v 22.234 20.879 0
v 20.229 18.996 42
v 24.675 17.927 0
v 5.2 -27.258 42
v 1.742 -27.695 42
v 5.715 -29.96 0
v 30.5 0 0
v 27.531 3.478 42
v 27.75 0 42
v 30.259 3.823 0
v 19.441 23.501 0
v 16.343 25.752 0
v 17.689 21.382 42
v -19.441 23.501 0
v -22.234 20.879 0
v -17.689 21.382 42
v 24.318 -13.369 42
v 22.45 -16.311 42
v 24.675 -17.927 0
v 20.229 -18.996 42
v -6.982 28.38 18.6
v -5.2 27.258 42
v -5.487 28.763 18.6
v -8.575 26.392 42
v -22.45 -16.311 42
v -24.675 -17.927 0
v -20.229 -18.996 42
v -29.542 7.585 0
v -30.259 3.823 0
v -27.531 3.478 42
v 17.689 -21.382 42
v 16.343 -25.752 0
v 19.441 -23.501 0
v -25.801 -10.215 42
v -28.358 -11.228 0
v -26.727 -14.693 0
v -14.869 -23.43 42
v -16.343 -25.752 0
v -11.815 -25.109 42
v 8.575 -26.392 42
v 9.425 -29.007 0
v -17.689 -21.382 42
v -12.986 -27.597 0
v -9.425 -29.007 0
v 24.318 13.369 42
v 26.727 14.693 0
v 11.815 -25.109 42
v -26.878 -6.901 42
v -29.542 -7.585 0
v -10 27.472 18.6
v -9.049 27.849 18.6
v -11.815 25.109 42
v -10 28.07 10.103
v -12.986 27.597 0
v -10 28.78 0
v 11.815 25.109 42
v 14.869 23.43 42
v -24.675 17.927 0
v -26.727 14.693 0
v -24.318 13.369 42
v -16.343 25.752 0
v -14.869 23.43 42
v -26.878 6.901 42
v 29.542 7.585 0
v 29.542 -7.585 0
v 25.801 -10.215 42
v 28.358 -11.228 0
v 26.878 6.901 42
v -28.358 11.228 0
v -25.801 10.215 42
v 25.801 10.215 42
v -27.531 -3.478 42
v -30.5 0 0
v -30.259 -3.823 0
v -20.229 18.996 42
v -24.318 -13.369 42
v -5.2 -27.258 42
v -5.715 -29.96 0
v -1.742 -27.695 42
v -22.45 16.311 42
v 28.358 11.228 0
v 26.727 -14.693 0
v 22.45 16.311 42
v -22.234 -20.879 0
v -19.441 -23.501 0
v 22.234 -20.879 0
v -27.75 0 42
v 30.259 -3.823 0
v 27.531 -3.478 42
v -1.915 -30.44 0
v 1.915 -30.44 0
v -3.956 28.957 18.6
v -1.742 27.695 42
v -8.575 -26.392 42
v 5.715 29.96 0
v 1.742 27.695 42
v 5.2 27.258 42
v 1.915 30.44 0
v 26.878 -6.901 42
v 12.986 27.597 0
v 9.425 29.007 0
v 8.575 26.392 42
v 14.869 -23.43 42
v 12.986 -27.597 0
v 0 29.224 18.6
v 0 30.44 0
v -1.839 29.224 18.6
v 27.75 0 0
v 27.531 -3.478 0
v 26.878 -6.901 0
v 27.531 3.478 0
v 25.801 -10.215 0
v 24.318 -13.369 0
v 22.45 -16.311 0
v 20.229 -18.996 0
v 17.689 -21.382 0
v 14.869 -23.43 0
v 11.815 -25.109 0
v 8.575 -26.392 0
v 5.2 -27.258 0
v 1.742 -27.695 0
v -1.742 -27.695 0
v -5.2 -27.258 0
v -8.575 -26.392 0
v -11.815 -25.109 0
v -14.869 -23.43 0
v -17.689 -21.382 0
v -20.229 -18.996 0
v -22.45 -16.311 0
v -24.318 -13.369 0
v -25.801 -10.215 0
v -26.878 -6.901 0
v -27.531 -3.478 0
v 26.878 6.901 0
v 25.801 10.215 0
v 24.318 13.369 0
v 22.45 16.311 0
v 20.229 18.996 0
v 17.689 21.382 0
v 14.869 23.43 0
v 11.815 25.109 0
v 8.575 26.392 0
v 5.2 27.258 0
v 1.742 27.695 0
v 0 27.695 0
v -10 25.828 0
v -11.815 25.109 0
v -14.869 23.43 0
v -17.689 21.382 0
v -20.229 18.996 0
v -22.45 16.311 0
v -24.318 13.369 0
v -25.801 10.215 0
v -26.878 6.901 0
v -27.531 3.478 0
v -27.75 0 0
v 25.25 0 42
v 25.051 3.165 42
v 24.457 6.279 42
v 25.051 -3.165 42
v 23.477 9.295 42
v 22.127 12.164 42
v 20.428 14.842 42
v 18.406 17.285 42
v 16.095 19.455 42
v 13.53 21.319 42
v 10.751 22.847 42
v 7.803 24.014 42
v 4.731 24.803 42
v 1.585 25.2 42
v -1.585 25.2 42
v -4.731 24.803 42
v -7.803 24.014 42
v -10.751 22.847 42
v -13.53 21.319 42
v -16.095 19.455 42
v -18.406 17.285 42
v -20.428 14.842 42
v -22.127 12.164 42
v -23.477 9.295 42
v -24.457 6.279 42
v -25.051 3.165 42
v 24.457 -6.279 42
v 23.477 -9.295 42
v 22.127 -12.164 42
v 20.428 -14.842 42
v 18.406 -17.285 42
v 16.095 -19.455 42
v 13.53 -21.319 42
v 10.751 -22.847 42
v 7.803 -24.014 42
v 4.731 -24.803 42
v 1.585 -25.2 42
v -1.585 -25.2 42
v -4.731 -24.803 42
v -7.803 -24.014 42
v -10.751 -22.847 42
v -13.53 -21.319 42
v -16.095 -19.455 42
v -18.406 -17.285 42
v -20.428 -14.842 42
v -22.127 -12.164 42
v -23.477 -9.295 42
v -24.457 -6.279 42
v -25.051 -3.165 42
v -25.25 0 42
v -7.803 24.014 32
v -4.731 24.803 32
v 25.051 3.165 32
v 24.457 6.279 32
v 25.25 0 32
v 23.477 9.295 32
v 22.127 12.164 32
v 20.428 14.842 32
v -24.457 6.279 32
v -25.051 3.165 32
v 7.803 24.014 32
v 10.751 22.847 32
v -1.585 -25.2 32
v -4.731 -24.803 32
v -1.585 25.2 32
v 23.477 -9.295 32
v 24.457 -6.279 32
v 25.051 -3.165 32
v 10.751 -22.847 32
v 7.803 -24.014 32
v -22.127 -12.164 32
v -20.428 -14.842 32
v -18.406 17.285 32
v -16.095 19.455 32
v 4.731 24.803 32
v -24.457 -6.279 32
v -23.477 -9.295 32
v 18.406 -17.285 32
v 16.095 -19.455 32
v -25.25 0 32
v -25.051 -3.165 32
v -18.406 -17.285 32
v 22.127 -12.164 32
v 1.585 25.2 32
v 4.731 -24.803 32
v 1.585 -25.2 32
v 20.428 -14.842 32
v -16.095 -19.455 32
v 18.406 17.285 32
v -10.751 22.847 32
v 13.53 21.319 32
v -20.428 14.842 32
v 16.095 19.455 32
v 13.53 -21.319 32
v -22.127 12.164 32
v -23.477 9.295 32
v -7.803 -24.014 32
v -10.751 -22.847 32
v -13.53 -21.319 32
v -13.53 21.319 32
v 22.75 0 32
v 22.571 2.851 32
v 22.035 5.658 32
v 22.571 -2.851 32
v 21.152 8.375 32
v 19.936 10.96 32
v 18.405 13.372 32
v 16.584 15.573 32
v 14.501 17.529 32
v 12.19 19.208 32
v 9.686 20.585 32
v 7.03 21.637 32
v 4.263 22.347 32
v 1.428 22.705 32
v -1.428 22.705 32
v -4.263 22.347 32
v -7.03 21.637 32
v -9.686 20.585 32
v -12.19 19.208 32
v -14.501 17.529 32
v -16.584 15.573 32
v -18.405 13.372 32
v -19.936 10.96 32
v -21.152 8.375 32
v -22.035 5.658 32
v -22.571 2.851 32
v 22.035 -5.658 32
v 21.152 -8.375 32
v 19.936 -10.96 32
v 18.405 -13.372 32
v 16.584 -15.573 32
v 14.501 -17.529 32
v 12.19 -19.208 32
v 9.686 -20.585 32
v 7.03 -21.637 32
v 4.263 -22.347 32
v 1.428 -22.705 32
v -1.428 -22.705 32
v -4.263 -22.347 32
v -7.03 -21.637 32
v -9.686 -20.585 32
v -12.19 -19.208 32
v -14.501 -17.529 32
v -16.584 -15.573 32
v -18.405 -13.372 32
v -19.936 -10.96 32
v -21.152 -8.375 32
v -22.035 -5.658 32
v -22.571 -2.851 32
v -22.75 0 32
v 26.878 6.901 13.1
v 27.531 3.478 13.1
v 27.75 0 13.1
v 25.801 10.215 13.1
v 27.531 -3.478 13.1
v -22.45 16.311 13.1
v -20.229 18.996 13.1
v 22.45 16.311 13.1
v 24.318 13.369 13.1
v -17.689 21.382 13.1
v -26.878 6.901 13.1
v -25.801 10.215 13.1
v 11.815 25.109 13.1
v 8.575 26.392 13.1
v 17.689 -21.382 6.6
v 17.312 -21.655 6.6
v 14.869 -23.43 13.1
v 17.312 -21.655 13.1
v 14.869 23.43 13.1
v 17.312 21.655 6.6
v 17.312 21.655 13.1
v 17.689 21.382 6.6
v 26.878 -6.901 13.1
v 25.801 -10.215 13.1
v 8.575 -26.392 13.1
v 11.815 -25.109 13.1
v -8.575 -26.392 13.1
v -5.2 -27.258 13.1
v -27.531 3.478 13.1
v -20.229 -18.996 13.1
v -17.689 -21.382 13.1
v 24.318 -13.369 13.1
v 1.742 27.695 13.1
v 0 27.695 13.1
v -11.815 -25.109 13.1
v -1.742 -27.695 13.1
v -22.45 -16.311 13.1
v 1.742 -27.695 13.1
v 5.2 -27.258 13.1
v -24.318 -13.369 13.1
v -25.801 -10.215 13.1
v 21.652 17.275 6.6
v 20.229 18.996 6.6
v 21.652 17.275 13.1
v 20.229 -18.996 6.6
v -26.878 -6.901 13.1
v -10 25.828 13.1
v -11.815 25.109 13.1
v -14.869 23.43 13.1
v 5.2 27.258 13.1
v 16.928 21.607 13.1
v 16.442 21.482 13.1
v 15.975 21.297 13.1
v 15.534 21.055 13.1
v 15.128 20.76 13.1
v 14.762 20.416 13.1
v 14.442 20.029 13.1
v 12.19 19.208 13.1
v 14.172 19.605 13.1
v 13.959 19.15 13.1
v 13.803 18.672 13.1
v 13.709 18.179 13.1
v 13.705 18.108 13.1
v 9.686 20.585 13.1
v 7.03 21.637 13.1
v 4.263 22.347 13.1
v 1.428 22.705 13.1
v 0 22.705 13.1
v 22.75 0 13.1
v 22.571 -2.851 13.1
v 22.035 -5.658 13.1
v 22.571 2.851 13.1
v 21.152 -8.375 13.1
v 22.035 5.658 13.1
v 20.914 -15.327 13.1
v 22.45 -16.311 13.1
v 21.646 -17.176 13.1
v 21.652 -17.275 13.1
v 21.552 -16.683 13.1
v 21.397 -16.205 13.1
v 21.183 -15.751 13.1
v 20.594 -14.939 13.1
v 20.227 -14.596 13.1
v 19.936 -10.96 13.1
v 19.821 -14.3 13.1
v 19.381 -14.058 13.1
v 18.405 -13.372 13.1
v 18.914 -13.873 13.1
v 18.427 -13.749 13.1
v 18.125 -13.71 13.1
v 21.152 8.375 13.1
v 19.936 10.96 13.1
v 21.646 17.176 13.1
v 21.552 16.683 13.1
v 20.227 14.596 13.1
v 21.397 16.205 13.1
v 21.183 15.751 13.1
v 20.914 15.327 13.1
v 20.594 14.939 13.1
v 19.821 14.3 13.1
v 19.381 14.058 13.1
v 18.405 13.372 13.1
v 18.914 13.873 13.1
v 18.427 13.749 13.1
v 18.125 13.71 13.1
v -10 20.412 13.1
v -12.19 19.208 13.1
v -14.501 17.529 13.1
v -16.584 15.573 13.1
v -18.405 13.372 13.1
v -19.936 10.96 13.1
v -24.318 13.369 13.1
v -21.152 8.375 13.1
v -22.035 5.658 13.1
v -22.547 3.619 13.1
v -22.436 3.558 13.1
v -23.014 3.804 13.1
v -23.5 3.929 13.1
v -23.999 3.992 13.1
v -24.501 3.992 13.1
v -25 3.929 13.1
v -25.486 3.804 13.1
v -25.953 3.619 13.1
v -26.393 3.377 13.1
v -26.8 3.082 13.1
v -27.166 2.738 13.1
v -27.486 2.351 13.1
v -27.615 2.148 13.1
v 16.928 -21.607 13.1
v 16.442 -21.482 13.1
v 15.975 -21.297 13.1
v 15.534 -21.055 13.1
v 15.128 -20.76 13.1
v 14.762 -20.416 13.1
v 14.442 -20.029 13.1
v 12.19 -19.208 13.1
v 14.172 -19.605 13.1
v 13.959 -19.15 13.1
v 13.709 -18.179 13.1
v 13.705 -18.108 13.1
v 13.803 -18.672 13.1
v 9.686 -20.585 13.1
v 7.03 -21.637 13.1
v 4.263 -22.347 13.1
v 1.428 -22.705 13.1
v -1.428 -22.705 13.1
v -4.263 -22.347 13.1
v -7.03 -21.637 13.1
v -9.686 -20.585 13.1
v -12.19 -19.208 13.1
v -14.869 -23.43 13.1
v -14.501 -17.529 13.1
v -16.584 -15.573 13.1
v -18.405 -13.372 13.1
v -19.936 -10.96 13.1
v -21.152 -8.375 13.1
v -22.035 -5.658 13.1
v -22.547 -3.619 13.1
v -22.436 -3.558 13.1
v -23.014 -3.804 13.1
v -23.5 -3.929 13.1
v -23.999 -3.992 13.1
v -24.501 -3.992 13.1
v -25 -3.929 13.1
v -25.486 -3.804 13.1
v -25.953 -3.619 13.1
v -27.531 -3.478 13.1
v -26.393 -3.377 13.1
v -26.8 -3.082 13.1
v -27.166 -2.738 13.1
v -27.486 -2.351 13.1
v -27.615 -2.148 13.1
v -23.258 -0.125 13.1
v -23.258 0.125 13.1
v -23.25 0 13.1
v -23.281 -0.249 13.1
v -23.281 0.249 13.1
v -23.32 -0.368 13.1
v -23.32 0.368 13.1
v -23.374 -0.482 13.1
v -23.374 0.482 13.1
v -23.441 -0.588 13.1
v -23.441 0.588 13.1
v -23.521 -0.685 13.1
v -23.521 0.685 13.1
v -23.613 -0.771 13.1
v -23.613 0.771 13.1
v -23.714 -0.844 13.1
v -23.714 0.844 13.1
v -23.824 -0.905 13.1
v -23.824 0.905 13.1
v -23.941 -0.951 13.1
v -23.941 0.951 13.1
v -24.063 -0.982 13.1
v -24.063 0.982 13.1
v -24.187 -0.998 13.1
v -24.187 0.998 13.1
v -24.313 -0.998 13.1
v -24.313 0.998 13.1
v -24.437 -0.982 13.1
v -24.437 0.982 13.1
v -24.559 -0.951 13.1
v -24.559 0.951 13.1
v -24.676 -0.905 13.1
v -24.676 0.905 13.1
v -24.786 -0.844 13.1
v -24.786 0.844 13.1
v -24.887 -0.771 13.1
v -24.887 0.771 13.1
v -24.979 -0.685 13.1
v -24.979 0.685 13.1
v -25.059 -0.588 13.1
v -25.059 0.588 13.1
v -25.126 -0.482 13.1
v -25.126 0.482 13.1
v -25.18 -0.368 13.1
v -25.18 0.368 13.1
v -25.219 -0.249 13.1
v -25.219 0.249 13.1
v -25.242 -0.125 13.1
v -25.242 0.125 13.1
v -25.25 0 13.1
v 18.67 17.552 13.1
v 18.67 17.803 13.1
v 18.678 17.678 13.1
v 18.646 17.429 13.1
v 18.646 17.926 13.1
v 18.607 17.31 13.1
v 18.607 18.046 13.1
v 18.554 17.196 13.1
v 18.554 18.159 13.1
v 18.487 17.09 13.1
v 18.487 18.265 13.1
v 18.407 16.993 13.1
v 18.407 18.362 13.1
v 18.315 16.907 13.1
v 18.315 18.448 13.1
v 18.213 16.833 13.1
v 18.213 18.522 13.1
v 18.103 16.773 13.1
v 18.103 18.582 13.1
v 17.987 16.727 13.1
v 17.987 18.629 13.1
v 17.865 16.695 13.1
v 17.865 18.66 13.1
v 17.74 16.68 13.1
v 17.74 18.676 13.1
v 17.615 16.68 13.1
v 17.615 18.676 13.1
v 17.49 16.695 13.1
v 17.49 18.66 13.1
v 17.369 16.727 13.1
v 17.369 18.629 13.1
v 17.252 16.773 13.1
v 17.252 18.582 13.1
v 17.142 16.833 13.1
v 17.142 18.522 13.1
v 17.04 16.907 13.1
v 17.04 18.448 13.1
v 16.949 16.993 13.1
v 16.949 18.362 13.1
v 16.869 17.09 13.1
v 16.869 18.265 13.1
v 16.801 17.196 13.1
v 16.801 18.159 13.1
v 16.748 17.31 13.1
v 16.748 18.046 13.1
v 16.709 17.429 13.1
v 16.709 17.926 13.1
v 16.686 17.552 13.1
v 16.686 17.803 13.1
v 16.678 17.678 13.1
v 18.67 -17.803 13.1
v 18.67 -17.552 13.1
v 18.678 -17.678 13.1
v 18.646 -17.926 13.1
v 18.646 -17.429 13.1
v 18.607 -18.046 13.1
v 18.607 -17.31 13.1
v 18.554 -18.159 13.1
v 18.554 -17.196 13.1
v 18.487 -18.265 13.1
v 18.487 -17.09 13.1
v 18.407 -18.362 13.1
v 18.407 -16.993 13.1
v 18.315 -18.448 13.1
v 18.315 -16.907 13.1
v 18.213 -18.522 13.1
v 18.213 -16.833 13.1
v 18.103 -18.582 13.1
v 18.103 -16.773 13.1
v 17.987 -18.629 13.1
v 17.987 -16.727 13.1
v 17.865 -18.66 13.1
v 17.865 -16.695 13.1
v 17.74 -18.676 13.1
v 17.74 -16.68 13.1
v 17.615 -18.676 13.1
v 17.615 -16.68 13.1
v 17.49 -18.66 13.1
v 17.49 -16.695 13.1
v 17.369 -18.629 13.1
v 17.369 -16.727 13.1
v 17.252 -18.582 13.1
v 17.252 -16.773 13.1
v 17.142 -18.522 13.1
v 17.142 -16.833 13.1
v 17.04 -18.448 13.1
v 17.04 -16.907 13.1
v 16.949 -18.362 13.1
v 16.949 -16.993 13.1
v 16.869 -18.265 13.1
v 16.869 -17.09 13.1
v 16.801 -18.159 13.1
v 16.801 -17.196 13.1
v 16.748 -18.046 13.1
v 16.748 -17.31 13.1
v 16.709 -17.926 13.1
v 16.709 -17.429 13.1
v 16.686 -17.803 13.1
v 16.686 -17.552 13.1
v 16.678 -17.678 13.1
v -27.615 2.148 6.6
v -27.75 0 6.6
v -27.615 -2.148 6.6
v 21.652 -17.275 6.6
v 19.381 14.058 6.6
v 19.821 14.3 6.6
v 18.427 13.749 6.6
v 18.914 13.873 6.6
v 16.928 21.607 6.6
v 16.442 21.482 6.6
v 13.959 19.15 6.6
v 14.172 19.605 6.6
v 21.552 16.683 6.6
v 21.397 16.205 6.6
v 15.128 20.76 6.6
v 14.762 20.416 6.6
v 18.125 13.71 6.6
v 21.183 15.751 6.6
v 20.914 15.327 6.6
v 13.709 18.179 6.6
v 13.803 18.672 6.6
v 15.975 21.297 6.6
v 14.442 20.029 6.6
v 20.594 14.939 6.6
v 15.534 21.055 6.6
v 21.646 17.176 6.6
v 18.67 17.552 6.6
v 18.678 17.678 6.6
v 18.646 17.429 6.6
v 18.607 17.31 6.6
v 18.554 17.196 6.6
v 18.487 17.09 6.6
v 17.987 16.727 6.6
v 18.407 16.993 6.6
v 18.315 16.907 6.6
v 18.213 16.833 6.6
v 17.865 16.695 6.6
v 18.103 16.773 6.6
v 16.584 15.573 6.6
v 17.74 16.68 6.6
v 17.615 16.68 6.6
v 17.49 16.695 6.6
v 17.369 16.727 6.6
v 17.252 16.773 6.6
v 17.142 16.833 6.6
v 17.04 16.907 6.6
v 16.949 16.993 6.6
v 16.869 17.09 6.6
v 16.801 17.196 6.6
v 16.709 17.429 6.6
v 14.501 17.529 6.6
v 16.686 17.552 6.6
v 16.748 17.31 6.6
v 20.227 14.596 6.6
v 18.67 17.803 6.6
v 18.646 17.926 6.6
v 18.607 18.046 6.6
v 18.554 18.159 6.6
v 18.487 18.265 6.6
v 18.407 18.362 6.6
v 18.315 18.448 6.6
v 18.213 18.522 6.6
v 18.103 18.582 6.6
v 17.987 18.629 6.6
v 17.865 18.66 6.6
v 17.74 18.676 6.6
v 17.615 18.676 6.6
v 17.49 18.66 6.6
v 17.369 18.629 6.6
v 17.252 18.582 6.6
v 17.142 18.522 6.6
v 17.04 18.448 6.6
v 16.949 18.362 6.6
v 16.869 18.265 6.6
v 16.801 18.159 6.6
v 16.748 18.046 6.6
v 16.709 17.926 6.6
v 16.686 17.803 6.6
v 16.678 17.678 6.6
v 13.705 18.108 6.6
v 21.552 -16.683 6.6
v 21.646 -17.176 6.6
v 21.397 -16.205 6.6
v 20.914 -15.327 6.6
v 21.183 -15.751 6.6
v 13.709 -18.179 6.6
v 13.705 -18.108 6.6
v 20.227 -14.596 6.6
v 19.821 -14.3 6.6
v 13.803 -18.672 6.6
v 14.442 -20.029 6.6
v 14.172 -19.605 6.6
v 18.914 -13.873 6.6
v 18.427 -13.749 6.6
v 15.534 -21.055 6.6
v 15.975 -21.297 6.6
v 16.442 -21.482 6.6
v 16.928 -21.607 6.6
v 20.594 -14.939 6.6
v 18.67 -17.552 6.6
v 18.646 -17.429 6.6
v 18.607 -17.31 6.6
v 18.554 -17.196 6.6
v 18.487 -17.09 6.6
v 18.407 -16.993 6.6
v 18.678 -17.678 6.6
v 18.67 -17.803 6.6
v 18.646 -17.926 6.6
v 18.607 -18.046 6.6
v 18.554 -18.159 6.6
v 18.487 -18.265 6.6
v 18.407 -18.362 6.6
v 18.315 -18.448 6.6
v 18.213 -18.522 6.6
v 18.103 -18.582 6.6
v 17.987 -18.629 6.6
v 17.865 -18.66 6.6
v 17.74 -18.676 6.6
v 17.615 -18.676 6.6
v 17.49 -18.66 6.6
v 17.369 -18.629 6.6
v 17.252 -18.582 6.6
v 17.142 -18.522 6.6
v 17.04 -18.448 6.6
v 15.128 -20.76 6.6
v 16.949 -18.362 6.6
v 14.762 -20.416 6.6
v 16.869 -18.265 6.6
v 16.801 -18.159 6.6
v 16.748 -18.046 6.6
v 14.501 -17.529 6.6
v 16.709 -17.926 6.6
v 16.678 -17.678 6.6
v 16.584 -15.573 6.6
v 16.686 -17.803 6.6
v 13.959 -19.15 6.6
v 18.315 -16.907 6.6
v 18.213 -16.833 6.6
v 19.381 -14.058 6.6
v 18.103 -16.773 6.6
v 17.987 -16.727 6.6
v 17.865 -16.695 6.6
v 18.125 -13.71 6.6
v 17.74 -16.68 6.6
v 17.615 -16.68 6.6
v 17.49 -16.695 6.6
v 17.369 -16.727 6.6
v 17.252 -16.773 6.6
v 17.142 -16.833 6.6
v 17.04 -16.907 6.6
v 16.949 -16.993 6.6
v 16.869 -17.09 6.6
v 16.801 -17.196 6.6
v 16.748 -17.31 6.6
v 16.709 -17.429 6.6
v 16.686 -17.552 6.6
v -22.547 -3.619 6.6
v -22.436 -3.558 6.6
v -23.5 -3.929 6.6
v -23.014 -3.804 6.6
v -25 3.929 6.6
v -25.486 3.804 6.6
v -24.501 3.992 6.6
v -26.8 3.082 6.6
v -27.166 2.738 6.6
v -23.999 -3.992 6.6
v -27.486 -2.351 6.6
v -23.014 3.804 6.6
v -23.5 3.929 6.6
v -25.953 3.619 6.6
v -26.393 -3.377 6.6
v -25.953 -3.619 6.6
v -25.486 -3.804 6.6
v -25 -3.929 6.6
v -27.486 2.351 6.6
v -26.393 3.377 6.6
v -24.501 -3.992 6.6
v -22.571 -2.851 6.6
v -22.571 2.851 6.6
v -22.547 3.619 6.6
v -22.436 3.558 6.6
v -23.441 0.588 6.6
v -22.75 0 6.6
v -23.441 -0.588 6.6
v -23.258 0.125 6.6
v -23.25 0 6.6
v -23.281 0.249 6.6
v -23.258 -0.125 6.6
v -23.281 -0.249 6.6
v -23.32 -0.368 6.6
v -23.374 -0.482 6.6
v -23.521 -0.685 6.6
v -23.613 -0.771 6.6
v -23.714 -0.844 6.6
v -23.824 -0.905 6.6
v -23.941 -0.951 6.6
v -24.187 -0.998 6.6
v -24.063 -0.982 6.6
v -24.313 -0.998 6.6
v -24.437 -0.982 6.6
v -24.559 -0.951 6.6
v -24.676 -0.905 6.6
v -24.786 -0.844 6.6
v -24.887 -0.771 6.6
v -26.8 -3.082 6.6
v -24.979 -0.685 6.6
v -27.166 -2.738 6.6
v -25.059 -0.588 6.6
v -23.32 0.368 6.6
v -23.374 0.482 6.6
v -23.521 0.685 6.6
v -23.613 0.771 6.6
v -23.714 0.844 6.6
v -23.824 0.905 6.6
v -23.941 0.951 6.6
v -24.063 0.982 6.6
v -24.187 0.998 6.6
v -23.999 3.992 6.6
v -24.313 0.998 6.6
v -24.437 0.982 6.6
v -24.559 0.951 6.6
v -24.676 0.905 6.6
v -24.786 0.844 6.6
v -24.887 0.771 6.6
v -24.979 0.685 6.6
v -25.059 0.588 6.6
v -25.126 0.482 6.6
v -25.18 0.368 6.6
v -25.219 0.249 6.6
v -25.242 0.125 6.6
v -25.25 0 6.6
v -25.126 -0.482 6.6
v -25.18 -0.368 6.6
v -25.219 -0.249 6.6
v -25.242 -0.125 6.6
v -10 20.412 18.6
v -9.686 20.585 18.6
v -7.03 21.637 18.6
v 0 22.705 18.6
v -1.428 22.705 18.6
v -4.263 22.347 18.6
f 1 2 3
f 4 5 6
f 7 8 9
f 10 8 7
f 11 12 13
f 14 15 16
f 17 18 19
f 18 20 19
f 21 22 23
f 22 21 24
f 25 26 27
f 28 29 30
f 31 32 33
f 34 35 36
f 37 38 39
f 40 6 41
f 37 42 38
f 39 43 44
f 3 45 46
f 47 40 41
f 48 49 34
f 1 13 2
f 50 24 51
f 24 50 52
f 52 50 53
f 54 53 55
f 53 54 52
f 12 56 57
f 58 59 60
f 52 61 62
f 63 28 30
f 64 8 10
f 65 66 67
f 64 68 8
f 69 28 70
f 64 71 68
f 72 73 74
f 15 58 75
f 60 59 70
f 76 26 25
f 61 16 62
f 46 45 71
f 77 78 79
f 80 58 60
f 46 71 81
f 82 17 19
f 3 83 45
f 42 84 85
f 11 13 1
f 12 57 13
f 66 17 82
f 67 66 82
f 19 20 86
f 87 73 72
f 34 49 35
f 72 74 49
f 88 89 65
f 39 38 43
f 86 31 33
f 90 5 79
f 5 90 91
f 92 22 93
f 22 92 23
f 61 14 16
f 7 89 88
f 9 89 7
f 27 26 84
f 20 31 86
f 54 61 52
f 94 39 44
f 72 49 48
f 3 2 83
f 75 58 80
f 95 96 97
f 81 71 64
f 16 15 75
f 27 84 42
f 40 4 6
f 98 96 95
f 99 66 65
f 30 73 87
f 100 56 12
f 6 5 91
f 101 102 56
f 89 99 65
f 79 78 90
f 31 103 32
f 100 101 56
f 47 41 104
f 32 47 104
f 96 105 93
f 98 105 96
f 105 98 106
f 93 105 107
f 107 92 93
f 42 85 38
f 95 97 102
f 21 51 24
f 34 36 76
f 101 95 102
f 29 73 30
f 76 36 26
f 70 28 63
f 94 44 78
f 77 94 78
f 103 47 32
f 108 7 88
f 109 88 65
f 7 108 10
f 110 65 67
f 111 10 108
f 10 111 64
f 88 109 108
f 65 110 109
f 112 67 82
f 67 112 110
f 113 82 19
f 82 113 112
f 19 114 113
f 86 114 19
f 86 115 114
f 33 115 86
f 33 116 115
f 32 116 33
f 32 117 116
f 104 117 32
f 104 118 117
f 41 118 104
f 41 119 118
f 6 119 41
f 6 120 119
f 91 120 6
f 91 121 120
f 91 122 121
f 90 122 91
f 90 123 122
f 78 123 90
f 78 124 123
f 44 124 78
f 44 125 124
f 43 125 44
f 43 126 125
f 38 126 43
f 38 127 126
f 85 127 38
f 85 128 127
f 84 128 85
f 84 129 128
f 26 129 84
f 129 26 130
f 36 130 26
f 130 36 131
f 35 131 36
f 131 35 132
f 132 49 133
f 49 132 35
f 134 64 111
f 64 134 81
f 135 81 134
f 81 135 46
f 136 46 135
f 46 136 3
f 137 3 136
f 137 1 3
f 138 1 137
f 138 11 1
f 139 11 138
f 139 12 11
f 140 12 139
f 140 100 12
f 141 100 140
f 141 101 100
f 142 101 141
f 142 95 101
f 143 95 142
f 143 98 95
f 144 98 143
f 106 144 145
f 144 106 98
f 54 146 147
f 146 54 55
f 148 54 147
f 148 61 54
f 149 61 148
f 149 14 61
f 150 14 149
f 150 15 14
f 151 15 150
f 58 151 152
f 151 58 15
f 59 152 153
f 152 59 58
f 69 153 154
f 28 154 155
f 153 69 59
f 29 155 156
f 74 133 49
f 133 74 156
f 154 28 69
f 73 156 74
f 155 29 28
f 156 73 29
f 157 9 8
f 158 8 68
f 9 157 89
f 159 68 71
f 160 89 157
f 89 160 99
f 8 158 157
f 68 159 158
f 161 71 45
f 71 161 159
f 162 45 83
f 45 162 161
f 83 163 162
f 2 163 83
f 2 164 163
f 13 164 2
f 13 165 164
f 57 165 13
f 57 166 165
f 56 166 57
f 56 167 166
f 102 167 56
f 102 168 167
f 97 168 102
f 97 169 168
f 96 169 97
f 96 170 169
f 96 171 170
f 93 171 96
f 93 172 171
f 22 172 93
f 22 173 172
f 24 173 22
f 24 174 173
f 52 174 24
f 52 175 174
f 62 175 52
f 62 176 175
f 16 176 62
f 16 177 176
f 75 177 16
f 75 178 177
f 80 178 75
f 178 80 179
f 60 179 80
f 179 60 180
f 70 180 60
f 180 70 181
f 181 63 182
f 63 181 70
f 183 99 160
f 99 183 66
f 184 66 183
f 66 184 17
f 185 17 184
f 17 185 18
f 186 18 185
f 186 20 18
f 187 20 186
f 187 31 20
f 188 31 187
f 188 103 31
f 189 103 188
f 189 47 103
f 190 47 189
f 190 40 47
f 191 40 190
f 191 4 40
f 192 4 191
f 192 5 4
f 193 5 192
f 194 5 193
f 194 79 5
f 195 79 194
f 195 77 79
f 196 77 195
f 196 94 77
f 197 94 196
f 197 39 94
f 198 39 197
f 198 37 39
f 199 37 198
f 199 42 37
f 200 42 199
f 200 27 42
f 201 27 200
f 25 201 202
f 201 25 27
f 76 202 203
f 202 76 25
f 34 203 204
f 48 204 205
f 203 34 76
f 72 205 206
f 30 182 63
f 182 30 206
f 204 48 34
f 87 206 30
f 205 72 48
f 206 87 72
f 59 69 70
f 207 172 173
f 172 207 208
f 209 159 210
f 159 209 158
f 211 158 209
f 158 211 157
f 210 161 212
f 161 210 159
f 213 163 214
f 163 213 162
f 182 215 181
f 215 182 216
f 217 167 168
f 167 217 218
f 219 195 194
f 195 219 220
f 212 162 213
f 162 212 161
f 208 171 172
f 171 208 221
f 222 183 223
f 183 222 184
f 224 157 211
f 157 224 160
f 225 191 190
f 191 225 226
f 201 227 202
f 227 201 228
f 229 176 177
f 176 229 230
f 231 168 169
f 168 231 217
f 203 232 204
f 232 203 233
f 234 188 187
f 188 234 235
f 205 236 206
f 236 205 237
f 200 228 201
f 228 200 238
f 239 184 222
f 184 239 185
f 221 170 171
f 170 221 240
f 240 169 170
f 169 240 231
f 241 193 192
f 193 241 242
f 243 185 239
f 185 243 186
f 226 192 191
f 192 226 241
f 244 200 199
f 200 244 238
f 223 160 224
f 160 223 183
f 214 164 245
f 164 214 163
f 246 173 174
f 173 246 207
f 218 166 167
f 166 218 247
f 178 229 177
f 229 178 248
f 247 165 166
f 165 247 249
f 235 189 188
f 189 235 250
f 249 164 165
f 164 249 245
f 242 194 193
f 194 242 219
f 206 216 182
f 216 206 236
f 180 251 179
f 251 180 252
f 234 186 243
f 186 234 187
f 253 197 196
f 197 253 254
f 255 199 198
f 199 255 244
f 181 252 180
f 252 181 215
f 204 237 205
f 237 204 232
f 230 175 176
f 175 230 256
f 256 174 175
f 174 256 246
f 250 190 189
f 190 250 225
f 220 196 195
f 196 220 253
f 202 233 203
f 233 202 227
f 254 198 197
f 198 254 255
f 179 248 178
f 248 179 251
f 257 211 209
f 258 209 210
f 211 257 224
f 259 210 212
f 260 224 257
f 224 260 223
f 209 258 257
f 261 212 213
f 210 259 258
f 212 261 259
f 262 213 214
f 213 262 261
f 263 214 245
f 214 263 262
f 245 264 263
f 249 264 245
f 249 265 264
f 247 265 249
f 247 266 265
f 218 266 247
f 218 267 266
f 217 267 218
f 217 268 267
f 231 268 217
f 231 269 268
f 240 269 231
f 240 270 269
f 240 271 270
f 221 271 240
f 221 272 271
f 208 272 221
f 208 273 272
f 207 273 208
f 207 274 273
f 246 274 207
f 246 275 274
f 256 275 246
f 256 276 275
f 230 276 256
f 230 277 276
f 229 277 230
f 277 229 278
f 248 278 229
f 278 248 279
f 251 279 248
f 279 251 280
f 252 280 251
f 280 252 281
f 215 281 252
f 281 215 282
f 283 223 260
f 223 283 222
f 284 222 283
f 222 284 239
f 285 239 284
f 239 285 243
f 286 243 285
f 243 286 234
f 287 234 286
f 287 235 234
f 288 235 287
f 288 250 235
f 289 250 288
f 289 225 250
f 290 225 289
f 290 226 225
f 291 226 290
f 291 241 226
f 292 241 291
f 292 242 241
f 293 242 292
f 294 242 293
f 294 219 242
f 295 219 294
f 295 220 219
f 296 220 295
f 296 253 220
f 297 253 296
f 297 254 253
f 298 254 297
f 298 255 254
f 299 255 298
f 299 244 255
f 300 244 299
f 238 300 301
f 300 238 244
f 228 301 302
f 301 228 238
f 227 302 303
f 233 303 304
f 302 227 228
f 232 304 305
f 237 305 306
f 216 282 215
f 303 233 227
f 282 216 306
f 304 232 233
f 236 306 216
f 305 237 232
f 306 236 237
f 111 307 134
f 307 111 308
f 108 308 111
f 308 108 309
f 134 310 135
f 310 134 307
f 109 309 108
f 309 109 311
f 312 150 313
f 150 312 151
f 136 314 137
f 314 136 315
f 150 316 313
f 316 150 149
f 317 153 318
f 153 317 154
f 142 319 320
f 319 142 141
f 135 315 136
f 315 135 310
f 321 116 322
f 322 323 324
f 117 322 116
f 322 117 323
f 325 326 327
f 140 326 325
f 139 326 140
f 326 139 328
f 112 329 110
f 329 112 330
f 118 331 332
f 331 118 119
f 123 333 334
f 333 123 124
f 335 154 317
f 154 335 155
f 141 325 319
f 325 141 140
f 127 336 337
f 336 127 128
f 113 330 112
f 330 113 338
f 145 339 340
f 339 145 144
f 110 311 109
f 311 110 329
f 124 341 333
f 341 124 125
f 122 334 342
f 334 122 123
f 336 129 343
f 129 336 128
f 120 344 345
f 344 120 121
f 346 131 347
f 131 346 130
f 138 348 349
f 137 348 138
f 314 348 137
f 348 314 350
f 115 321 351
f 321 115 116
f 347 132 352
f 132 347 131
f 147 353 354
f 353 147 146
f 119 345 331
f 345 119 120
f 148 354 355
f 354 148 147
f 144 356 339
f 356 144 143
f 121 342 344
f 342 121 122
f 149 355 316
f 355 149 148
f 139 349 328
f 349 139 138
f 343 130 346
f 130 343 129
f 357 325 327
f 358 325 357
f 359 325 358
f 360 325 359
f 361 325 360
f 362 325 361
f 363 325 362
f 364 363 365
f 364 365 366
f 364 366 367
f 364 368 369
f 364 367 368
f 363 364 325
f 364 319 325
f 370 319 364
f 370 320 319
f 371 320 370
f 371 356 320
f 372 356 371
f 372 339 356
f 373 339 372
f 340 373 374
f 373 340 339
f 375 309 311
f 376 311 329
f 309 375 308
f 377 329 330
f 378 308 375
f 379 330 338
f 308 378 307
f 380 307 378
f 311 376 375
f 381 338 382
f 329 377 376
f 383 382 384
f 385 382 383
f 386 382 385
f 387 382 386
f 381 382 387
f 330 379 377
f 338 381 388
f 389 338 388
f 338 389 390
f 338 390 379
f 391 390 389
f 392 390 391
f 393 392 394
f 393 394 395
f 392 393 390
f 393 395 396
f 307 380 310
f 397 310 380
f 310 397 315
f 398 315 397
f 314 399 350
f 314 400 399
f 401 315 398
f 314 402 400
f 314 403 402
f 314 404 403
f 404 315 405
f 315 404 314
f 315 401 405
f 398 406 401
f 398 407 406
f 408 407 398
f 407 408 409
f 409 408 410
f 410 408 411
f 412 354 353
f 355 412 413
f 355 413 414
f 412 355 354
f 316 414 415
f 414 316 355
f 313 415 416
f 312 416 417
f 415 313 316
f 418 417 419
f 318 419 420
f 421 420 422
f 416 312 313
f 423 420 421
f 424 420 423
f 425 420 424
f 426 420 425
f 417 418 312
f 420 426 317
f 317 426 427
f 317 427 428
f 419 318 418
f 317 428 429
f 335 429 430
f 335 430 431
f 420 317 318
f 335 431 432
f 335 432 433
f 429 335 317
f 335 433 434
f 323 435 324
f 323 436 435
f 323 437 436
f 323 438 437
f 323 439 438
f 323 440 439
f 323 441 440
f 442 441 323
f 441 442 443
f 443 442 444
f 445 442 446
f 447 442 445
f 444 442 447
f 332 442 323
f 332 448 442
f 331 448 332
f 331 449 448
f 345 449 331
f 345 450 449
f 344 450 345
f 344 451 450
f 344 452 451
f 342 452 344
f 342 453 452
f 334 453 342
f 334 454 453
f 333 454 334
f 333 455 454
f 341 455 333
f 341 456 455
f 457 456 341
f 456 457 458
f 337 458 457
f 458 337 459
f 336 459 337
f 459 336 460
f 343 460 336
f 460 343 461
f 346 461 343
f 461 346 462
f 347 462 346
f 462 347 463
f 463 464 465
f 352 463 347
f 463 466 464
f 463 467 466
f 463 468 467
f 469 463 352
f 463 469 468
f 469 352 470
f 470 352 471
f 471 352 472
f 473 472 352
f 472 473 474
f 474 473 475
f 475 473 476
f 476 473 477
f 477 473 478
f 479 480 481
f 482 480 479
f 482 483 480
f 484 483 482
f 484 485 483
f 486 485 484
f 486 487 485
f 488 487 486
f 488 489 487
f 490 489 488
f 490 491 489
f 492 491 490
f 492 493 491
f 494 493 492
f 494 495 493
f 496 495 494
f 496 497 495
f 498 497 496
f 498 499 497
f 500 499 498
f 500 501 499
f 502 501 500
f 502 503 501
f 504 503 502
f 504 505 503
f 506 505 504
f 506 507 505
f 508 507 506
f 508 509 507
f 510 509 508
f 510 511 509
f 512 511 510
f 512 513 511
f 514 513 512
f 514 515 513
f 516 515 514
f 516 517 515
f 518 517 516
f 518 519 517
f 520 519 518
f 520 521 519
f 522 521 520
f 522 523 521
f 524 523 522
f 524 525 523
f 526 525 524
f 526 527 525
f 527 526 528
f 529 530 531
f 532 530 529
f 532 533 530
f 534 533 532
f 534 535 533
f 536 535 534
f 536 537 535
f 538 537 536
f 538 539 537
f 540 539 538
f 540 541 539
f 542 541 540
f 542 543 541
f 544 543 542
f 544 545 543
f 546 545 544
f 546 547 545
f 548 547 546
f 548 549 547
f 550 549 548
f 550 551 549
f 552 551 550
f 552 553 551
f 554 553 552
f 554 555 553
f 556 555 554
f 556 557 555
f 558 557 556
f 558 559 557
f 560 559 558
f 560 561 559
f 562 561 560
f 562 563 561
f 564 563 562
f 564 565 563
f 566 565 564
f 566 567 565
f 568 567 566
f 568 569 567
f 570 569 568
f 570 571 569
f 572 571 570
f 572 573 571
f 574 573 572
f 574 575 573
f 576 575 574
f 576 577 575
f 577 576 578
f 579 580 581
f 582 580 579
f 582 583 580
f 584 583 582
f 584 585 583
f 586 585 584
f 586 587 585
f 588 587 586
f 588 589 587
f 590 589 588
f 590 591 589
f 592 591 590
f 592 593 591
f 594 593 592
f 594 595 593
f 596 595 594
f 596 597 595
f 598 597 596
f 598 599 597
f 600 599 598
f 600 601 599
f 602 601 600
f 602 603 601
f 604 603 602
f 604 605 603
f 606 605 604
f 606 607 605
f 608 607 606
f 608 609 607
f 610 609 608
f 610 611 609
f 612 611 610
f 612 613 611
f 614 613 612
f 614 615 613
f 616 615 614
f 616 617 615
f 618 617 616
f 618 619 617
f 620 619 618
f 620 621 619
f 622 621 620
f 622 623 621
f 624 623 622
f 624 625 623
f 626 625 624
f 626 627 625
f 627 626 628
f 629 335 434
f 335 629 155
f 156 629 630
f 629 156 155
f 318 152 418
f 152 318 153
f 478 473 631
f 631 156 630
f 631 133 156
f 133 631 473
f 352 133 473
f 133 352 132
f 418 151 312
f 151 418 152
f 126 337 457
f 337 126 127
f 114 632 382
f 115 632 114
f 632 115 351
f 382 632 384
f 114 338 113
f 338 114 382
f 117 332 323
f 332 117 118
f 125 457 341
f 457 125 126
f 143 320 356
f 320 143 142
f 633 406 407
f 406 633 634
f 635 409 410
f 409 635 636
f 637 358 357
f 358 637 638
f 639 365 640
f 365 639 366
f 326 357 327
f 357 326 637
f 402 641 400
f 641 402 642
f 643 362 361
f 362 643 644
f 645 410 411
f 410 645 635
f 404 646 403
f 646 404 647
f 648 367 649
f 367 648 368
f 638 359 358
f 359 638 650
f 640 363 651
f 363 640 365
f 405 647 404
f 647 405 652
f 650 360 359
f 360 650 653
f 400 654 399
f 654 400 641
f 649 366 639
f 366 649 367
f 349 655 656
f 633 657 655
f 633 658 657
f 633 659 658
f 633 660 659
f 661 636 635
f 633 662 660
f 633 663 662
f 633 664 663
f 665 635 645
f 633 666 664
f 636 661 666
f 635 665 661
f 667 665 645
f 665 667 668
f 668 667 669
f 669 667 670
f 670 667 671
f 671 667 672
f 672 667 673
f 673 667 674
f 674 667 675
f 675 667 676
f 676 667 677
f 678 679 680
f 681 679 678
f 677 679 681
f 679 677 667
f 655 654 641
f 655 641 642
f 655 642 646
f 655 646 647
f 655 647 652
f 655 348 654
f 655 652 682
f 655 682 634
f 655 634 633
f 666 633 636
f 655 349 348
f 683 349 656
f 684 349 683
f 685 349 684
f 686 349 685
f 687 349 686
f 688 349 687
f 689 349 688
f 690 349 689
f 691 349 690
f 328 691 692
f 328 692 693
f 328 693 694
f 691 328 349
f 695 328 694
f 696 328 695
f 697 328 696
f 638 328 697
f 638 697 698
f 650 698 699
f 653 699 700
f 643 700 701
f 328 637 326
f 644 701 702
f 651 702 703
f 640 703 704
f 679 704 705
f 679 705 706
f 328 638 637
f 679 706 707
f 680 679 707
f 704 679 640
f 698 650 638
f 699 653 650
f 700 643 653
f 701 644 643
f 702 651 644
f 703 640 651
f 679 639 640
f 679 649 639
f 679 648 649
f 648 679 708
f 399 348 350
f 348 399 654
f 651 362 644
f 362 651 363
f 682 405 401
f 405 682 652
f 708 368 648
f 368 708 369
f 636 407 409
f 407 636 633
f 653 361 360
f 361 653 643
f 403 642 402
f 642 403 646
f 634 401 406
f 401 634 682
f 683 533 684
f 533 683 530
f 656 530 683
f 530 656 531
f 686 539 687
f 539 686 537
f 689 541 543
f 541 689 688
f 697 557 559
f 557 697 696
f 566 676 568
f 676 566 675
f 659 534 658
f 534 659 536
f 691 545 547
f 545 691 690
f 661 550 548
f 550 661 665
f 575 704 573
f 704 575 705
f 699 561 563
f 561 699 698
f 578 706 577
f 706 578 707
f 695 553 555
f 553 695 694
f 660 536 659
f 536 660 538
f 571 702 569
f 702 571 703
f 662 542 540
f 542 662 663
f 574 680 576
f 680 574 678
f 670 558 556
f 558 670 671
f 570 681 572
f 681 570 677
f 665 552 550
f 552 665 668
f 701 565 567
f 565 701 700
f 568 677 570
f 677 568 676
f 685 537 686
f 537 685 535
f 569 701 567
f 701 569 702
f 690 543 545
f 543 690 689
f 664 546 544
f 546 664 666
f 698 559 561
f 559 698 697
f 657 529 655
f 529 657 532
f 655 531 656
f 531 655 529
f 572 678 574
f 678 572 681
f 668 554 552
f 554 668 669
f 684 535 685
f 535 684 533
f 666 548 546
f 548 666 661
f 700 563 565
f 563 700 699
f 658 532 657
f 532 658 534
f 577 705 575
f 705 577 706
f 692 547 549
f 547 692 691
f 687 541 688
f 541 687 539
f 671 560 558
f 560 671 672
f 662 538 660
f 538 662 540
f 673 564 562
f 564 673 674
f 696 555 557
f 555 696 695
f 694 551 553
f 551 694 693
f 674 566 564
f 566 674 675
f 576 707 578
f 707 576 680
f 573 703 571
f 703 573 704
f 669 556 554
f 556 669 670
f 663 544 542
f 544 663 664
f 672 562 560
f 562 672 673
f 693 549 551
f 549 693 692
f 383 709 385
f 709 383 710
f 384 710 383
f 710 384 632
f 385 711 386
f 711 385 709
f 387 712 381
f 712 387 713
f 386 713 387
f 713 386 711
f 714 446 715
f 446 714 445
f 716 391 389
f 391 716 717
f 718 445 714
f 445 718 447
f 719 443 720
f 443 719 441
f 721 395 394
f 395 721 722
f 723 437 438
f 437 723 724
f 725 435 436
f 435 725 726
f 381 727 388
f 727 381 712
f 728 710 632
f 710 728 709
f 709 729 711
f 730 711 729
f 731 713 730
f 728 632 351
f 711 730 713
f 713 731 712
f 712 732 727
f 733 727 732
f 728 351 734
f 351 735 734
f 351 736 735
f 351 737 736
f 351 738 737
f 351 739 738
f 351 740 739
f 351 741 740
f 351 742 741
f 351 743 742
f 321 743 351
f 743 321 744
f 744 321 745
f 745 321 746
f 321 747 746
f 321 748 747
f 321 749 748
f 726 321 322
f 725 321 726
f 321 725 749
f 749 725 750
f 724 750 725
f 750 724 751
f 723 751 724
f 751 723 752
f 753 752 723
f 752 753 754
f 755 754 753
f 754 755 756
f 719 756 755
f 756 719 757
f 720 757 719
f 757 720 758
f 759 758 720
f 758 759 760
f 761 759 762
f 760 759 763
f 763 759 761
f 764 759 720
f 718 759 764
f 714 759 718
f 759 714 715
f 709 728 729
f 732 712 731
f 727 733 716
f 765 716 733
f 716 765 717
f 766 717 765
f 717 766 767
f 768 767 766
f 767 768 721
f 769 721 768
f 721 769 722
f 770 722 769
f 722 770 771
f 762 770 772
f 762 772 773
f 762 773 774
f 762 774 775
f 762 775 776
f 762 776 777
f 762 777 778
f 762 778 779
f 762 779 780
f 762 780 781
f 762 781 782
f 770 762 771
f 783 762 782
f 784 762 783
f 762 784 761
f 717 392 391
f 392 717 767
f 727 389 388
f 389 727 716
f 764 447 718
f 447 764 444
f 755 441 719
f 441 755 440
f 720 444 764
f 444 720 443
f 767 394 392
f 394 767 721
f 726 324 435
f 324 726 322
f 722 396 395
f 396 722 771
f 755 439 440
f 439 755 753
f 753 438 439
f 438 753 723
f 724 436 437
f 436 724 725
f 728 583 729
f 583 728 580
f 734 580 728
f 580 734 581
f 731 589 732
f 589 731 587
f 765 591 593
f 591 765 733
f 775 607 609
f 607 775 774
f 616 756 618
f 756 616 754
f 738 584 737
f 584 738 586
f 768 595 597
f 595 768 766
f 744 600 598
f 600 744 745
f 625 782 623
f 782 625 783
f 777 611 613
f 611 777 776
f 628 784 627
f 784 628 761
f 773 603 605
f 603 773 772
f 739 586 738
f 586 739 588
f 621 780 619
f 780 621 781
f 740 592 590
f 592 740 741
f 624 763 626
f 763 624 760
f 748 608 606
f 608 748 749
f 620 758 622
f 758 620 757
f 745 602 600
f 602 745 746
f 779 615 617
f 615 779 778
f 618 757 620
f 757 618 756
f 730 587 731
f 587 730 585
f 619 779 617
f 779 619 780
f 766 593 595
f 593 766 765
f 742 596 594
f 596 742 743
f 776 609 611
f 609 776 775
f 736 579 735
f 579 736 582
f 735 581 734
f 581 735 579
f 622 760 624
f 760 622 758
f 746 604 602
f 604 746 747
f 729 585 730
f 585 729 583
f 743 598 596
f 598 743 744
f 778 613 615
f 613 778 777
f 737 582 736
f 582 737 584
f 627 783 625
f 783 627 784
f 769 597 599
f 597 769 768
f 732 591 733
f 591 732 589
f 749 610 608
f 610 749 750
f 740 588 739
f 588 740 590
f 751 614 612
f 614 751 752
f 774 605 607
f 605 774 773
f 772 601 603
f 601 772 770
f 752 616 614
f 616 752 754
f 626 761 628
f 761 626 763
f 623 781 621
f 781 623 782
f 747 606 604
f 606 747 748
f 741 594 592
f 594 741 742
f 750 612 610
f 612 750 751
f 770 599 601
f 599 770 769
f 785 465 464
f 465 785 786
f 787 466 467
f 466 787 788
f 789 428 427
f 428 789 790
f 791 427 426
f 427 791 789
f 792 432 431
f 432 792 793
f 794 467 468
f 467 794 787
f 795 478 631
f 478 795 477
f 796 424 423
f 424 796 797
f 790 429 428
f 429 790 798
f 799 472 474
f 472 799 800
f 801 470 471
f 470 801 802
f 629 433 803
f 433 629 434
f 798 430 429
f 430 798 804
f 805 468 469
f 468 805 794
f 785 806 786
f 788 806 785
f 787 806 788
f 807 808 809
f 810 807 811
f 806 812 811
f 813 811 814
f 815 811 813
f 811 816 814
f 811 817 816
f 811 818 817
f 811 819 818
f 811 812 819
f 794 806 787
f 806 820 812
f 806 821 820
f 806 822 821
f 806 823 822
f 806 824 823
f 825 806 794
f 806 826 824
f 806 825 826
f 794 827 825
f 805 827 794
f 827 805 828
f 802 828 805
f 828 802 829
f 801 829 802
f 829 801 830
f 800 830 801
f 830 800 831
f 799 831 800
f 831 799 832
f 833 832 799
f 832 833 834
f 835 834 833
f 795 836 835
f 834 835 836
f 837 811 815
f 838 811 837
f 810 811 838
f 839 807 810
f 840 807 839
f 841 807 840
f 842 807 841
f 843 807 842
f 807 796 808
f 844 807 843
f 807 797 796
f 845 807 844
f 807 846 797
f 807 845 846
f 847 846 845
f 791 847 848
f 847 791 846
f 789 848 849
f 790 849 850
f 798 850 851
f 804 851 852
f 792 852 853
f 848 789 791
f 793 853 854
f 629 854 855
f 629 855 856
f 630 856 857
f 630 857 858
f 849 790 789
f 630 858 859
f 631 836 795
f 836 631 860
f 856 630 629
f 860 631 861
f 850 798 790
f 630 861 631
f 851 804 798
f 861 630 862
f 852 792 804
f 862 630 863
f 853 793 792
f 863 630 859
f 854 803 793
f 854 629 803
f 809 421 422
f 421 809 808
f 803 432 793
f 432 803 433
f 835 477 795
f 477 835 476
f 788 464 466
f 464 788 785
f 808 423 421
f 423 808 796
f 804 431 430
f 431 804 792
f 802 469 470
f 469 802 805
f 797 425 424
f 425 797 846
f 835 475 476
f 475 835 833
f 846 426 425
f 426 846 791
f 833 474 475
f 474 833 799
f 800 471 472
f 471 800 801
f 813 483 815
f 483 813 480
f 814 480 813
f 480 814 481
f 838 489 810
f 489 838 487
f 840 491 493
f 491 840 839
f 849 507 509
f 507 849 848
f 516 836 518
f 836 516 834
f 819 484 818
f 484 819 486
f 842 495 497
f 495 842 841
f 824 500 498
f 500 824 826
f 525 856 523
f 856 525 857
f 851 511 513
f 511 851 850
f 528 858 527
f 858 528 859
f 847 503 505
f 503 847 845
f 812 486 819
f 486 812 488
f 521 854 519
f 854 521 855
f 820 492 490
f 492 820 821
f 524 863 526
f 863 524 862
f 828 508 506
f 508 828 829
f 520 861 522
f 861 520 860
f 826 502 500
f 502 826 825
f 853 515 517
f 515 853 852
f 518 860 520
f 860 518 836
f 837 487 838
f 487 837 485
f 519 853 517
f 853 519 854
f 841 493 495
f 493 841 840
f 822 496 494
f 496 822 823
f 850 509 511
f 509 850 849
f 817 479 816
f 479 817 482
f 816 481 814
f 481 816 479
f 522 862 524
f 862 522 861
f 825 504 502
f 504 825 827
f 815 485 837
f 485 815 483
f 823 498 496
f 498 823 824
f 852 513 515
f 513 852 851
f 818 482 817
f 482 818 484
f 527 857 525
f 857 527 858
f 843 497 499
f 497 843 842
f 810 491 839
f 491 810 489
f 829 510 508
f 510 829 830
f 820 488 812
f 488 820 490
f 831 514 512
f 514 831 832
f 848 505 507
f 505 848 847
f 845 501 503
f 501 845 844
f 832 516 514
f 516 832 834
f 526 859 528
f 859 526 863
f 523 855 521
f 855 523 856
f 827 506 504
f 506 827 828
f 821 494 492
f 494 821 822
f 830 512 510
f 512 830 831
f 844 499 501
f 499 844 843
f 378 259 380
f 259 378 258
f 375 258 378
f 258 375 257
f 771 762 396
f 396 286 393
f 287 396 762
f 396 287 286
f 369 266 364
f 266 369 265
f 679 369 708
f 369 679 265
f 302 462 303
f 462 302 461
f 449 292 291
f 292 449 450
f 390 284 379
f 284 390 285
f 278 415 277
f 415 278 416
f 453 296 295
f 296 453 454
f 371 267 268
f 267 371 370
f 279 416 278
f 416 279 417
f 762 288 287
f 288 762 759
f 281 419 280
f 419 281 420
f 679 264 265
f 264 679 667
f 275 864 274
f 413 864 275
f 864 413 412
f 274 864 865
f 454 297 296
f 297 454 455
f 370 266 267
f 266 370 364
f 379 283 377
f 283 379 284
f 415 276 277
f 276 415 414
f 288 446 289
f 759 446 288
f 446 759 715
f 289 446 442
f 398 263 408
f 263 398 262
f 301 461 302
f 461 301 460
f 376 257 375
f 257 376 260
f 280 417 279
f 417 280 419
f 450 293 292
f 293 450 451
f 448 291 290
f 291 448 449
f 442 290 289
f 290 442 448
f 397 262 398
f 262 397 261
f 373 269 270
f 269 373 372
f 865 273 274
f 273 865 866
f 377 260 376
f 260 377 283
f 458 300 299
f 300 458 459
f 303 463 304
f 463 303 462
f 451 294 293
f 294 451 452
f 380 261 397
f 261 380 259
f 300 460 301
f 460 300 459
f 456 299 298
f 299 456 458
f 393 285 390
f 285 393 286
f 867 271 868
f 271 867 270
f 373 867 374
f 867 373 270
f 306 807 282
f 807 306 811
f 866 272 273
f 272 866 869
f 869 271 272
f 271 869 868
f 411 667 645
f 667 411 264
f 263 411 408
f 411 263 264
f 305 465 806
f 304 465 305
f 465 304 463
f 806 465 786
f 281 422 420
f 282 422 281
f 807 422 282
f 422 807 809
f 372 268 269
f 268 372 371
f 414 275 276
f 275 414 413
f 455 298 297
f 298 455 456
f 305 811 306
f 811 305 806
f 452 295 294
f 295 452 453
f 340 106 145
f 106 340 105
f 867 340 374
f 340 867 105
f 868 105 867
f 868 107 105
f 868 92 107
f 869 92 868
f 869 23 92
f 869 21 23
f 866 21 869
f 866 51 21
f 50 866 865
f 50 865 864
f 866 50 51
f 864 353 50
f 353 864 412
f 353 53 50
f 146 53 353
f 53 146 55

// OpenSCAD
/*
Author: Kevin Lutzer
Date Created: Oct 9 2016

Description: Holder for a LED flashlight I made to project light into a lamp
*/

//////////////////////////////////////////////// Parameters ////////////////////////////////////////////////////////

polygon_sides = 50;

stone_diameter = 50.5;
stone_depth = 10;
base_width = 61; 
base_height = 42;
wall_thickness = 5;
tunnel_diameter = stone_diameter - wall_thickness; 

board_joint_height = 5;
board_thickness = 1.6;
component_height = 6.5;

board_height = board_joint_height + board_thickness + component_height;
board_diameter = 55.5;
board_mount_hole_offset = 3.5;
power_connector_height = 12; 
power_connector_width = 10;
power_connector_length = 14.5;

screw_diameter = 2;
screw_height = 8;


//////////////////////////////////////////////// Functional Prototypes ////////////////////////////////////////////

light_cone();

//////////////////////////////////////////////// Modules ///////////////////////////////////////////////////////////

module light_cone(){
    difference(){
        union(){
            base();
            screw_post_addition();
        }
        cylinder(base_height, d1 = tunnel_diameter, d2 = tunnel_diameter, 0, $fn=polygon_sides);
        translate([-power_connector_width,board_diameter/2-power_connector_length+(base_width-board_diameter)/2,0]){
            power_connector();
        }
    }
}

module base(){
    difference(){
        cylinder(base_height, d1 = base_width, d2 = stone_diameter+wall_thickness, 0, $fn=polygon_sides );
        translate([0,0,base_height-stone_depth]){
            cylinder(stone_depth, d1 = stone_diameter, d2 = stone_diameter, 0, $fn=polygon_sides);
        }
        cylinder(board_height, d1 = board_diameter, d2 = board_diameter, 0, $fn=polygon_sides);
        
    }
}
    
module mounting_post(){
    difference(){
        cylinder(component_height, d1 = 2*(base_width - board_diameter)-3, d2 = 2*(base_width - board_diameter)-3, 0, $fn = polygon_sides);
        cylinder(screw_height, d1 = screw_diameter, d2 = screw_diameter, 0, $fn = polygon_sides );
    }
}

module power_connector(){
    cube([power_connector_width, power_connector_length, power_connector_height + board_joint_height + board_thickness],0);
}

module screw_post_addition(){
     translate([(base_width/2-(base_width - board_diameter))/sqrt(2),(base_width/2-(base_width - board_diameter))/sqrt(2),board_joint_height+board_thickness]){
            mounting_post();
        }
        translate([+(base_width/2-(base_width - board_diameter))/sqrt(2),-(base_width/2-(base_width - board_diameter))/sqrt(2),board_joint_height+board_thickness]){
            mounting_post();
        }
        translate([-(board_diameter/2 - board_mount_hole_offset), 0,board_joint_height+board_thickness]){
            mounting_post();
        }
}
